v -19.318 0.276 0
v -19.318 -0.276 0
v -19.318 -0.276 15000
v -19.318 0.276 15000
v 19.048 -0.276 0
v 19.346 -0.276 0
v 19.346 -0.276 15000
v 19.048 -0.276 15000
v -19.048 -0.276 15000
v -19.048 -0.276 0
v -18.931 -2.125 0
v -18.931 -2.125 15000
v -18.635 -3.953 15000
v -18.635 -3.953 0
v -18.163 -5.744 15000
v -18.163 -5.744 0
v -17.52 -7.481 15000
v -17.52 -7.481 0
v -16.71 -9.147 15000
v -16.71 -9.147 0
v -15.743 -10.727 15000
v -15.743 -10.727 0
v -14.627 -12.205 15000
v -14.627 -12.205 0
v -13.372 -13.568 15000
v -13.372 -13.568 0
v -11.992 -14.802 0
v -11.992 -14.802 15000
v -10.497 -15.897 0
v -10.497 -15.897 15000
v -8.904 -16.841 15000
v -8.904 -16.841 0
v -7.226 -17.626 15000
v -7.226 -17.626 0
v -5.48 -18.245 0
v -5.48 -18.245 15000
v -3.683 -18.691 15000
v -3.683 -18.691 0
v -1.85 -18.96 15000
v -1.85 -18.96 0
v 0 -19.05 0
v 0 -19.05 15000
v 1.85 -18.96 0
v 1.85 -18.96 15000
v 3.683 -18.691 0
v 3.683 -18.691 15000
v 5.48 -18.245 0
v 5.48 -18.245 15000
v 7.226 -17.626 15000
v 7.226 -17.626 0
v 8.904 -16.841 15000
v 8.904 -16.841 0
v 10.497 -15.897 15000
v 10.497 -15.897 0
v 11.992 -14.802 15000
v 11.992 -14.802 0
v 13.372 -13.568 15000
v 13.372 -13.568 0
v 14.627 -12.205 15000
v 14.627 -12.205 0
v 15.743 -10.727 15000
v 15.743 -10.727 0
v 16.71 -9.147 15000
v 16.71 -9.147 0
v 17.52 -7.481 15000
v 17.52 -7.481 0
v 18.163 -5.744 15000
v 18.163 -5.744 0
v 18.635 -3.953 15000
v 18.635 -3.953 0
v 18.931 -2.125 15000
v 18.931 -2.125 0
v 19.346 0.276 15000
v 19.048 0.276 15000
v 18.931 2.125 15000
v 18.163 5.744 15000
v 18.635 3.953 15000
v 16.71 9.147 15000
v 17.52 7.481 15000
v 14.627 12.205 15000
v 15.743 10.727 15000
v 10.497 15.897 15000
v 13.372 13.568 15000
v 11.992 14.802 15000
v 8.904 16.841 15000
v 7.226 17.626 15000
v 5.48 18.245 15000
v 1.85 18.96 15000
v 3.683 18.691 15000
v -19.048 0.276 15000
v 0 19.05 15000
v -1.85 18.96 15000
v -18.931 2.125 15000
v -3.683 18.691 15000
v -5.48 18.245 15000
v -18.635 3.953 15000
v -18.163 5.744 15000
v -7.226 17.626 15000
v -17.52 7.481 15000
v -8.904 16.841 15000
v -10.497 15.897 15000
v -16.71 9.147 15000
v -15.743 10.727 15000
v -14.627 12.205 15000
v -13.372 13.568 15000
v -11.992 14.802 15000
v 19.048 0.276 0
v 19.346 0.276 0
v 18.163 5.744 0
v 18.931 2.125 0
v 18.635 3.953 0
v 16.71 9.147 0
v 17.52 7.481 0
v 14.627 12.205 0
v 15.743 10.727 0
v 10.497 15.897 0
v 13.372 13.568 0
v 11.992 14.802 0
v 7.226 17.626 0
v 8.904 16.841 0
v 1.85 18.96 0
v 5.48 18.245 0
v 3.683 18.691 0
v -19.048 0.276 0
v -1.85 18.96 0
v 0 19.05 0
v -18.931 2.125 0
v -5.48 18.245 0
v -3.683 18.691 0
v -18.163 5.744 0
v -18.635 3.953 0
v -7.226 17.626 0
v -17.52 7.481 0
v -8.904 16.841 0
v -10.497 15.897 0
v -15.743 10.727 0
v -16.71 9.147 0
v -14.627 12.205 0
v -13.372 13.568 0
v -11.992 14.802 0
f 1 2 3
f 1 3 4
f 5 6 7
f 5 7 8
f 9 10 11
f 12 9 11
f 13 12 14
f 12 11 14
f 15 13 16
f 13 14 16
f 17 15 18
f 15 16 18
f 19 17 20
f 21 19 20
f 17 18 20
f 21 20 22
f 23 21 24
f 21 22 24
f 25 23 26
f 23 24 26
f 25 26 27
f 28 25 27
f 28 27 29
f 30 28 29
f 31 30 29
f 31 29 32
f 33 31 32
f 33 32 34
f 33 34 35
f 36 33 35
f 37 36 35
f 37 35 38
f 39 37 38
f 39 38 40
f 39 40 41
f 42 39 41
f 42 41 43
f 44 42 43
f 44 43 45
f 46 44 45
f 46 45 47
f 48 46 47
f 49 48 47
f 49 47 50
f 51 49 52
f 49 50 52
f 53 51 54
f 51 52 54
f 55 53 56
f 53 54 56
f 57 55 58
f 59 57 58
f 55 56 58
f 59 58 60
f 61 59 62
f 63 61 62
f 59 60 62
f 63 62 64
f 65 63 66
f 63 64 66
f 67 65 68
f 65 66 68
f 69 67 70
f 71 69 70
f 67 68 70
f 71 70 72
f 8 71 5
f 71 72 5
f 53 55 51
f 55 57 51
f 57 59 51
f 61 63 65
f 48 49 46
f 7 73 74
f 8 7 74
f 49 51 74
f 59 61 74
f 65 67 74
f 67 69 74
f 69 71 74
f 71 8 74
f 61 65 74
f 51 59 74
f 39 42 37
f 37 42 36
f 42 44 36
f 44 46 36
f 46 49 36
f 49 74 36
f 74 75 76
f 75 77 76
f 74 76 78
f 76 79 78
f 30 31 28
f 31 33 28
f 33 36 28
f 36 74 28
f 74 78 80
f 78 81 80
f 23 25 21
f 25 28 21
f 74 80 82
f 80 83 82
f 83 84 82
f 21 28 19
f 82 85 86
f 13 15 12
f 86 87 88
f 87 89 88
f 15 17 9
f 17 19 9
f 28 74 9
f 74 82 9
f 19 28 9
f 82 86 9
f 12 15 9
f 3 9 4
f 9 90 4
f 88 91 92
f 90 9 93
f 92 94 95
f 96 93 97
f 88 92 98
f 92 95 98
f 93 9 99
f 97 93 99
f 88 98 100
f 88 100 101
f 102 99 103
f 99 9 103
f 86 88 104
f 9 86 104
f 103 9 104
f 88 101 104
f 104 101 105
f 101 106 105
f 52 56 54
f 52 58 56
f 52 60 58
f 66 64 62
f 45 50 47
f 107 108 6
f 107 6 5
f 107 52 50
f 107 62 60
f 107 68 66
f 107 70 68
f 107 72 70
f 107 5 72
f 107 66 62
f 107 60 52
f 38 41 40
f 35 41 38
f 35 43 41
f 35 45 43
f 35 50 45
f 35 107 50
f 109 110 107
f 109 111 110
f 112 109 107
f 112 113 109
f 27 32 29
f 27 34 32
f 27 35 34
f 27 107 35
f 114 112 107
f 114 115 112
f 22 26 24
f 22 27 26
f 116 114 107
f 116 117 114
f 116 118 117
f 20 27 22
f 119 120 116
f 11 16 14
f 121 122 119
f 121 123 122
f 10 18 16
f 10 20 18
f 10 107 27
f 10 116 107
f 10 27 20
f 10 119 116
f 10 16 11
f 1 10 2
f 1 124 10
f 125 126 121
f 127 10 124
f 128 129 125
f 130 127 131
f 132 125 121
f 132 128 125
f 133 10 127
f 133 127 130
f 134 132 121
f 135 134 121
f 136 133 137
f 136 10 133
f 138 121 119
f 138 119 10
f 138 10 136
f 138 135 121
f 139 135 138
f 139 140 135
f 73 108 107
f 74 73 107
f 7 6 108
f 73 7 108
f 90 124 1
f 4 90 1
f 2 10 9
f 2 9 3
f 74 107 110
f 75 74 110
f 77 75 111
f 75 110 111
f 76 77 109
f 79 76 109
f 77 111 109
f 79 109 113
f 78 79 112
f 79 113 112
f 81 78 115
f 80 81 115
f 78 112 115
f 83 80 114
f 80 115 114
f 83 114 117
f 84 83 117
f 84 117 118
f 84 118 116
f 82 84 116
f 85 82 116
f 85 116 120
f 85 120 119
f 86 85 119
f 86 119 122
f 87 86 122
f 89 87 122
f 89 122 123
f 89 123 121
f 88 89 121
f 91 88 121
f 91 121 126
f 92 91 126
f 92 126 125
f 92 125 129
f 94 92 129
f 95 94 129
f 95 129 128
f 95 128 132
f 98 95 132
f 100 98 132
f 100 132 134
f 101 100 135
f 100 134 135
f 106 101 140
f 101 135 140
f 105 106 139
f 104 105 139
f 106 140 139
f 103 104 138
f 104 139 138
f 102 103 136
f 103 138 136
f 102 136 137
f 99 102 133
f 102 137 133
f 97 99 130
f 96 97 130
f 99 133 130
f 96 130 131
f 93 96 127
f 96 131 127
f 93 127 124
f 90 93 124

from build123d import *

# Parameters (mm, degrees)
CROQUIS1_R              = 19.05
SALIENTE_EXTRUIR1_DEPTH = 15000
CROQUIS2_W              = 0.59220922
CROQUIS2_H              = 0.552153
SALIENTE_EXTRUIR2_DEPTH = 15000
CROQUIS3_W              = 0.53526764
CROQUIS3_H              = 0.552153
SALIENTE_EXTRUIR3_DEPTH = 15000


with BuildPart() as part:
    # Croquis1 → Saliente-Extruir1 (new body)
    with BuildSketch(Plane.XY):
        Circle(CROQUIS1_R)
    extrude(amount=SALIENTE_EXTRUIR1_DEPTH)

    # Croquis2 → Saliente-Extruir2 (add)
    with BuildSketch(Plane(origin=(0, 0, 0), x_dir=(-1, 0, 0), z_dir=(0, 0, -1))):
        with Locations((-19.05, 0)):
            Rectangle(CROQUIS2_W, CROQUIS2_H)
    extrude(amount=-SALIENTE_EXTRUIR2_DEPTH)

    # Croquis3 → Saliente-Extruir3 (add)
    with BuildSketch(Plane(origin=(0, 0, 0), x_dir=(-1, 0, 0), z_dir=(0, 0, -1))):
        with Locations((19.05, 0)):
            Rectangle(CROQUIS3_W, CROQUIS3_H)
    extrude(amount=-SALIENTE_EXTRUIR3_DEPTH)


solid = part.part
